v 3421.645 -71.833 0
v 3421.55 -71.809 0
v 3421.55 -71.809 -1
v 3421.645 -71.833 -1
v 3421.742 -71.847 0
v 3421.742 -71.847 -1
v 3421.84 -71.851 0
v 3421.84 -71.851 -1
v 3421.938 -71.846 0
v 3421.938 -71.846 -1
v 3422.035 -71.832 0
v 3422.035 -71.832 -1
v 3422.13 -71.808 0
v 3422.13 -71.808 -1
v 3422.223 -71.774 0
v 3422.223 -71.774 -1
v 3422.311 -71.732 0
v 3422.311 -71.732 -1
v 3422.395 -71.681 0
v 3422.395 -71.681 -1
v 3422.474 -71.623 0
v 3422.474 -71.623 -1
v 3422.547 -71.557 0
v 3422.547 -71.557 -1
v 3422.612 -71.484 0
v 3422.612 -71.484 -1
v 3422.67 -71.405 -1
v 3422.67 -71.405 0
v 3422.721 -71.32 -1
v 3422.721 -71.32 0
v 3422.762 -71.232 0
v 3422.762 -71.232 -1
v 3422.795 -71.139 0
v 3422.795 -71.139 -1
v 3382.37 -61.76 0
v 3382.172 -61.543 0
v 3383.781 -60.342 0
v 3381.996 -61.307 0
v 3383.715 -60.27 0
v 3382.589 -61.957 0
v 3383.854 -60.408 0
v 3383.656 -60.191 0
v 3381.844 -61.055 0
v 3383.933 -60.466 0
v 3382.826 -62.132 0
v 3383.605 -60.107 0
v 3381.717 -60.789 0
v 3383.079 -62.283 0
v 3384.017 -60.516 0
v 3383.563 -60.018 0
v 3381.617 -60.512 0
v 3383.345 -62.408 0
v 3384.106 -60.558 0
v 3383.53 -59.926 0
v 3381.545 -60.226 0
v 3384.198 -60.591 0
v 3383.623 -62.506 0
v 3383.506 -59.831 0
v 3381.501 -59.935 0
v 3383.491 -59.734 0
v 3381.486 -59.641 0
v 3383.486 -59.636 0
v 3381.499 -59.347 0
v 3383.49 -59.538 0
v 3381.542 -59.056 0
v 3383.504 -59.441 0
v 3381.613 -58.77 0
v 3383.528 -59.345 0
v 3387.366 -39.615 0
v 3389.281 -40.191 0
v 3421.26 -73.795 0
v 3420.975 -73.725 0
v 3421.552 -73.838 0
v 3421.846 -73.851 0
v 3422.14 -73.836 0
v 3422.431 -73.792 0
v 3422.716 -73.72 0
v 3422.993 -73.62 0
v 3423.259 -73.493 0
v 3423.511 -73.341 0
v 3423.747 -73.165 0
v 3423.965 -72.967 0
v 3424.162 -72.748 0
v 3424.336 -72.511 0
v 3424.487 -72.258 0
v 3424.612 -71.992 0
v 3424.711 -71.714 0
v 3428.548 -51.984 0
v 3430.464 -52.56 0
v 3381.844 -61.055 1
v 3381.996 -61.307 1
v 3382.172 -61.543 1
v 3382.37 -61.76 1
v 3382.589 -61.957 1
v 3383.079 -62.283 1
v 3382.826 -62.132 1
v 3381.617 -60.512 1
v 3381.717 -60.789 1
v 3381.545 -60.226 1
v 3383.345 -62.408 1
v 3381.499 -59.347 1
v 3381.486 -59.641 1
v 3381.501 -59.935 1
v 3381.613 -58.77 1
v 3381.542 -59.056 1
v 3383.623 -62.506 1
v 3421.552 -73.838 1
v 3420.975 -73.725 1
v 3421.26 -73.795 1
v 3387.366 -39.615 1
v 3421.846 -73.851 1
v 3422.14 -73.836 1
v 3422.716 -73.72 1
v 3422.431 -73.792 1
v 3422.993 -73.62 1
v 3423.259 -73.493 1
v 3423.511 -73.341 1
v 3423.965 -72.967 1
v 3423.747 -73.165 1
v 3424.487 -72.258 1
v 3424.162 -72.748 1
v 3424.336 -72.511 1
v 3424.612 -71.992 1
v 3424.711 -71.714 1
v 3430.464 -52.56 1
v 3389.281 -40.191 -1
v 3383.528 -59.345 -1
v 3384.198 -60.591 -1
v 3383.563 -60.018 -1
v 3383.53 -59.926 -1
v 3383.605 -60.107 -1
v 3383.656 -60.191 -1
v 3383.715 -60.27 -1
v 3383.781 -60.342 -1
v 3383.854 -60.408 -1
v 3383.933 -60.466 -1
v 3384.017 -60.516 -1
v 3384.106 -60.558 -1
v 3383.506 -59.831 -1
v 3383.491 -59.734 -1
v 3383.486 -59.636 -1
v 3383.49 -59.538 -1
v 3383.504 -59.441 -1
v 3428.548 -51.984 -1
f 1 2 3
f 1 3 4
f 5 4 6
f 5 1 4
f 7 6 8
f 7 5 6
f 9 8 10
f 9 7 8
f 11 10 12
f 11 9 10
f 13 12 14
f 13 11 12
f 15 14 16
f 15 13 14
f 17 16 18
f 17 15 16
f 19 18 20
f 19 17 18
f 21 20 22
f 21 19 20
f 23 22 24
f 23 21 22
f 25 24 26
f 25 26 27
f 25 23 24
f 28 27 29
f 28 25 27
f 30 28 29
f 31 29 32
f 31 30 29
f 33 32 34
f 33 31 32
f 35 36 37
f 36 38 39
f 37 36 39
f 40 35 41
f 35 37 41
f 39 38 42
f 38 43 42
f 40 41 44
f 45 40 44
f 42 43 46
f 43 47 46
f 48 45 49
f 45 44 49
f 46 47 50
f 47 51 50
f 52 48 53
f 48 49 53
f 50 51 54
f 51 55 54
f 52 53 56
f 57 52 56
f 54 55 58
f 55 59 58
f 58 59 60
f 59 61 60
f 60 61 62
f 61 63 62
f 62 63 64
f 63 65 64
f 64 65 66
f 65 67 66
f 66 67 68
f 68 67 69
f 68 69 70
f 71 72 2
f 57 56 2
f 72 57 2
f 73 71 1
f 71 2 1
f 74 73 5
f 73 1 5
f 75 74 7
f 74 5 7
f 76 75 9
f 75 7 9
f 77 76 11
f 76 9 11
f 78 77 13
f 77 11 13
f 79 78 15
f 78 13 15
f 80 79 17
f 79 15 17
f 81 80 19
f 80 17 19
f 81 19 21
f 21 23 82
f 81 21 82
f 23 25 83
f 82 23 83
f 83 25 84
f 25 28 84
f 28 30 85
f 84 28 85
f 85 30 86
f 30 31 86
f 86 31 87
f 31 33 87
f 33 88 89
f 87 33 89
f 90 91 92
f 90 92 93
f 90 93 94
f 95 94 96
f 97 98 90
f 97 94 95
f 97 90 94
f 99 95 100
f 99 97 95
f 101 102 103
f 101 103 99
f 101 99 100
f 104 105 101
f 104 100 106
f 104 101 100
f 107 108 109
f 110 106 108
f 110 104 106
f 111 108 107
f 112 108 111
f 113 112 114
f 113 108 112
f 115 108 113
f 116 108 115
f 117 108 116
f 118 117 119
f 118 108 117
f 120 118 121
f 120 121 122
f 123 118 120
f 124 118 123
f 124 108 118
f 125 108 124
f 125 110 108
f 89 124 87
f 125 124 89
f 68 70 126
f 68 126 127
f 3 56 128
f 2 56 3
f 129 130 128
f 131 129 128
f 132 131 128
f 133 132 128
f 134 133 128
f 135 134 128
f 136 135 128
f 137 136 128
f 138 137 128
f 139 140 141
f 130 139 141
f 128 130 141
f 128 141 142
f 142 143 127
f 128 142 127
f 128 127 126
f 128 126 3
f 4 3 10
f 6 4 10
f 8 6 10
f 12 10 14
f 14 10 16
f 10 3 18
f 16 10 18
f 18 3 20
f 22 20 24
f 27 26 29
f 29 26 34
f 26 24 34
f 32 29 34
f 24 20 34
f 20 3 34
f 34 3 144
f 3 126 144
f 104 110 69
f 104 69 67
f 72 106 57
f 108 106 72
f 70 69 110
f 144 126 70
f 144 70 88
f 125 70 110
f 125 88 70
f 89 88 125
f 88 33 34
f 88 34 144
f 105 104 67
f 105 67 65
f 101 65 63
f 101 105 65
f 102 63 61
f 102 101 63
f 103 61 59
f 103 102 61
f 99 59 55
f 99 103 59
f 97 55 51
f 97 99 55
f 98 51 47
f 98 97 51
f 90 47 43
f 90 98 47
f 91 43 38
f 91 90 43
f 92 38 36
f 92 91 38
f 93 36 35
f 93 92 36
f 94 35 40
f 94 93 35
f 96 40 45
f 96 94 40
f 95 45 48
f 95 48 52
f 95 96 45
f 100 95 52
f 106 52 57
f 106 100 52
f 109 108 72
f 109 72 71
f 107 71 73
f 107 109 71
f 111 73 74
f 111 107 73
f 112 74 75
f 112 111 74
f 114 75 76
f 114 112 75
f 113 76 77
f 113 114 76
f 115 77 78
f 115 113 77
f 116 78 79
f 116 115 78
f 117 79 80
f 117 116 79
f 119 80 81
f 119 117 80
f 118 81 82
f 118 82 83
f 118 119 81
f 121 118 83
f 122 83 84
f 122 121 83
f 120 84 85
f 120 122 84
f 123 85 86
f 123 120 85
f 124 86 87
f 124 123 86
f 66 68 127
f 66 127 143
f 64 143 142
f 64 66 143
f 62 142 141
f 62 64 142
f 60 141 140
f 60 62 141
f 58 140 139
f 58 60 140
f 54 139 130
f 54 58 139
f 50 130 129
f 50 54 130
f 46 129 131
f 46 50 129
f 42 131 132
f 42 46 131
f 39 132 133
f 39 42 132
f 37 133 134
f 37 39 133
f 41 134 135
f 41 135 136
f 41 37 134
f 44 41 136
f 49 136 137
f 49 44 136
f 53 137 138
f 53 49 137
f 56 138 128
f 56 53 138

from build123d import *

# Parameters (mm, degrees)
BOSS_EXTRUDE1_DEPTH = 1
BOSS_EXTRUDE2_DEPTH = 1
CUT_EXTRUDE1_DEPTH  = 10


with BuildPart() as part:
    # Sketch1 → Boss-Extrude1 (new body)
    with BuildSketch(Plane.XY):
        with BuildLine():
            ThreePointArc((3432.575330737, -38.576109077), (3432.498215735, -37.814637007), (3431.90524513, -37.330723482))
            Line((3431.90524513, -37.330723482), (3394.553556699, -26.112373721))
            ThreePointArc((3394.553556699, -26.112373721), (3393.792084629, -26.189488722), (3393.308171105, -26.782459328))
            Line((3393.308171105, -26.782459328), (3383.528071313, -59.345469754))
            ThreePointArc((3383.528071313, -59.345469754), (3383.605186314, -60.106941825), (3384.198156919, -60.590855349))
            Line((3384.198156919, -60.590855349), (3421.54984535, -71.809205111))
            ThreePointArc((3421.54984535, -71.809205111), (3422.311317421, -71.732090109), (3422.795230945, -71.139119504))
            Line((3422.795230945, -71.139119504), (3432.575330737, -38.576109077))
        make_face()
    extrude(amount=-BOSS_EXTRUDE1_DEPTH)

    # Sketch1<4> → Boss-Extrude2 (add)
    with BuildSketch(Plane.XY):
        with BuildLine():
            ThreePointArc((3395.128856687, -24.196902519), (3392.844440476, -24.428247524), (3391.392699903, -26.20715934))
            Line((3391.392699903, -26.20715934), (3381.612600111, -58.770169767))
            ThreePointArc((3381.612600111, -58.770169767), (3381.843945116, -61.054585978), (3383.622856932, -62.506326551))
            Line((3383.622856932, -62.506326551), (3420.974545362, -73.724676312))
            ThreePointArc((3420.974545362, -73.724676312), (3423.258961574, -73.493331308), (3424.710702146, -71.714419492))
            Line((3424.710702146, -71.714419492), (3434.490801939, -39.151409065))
            ThreePointArc((3434.490801939, -39.151409065), (3434.259456934, -36.866992853), (3432.480545118, -35.415252281))
            Line((3432.480545118, -35.415252281), (3395.128856687, -24.196902519))
        make_face()
    extrude(amount=BOSS_EXTRUDE2_DEPTH)

    # Sketch2 → Cut-Extrude1 (cut)
    with BuildSketch(Plane(origin=(0, 0, -1), x_dir=(-1, 0, 0), z_dir=(0, 0, -1))):
        Polygon((-3455.741612738, -34.933179244), (-3387.643444689, -14.48031354), (-3380.69590789, -37.612256774), (-3448.79407594, -58.065122478), align=None)
    extrude(amount=-CUT_EXTRUDE1_DEPTH, mode=Mode.SUBTRACT)


solid = part.part
